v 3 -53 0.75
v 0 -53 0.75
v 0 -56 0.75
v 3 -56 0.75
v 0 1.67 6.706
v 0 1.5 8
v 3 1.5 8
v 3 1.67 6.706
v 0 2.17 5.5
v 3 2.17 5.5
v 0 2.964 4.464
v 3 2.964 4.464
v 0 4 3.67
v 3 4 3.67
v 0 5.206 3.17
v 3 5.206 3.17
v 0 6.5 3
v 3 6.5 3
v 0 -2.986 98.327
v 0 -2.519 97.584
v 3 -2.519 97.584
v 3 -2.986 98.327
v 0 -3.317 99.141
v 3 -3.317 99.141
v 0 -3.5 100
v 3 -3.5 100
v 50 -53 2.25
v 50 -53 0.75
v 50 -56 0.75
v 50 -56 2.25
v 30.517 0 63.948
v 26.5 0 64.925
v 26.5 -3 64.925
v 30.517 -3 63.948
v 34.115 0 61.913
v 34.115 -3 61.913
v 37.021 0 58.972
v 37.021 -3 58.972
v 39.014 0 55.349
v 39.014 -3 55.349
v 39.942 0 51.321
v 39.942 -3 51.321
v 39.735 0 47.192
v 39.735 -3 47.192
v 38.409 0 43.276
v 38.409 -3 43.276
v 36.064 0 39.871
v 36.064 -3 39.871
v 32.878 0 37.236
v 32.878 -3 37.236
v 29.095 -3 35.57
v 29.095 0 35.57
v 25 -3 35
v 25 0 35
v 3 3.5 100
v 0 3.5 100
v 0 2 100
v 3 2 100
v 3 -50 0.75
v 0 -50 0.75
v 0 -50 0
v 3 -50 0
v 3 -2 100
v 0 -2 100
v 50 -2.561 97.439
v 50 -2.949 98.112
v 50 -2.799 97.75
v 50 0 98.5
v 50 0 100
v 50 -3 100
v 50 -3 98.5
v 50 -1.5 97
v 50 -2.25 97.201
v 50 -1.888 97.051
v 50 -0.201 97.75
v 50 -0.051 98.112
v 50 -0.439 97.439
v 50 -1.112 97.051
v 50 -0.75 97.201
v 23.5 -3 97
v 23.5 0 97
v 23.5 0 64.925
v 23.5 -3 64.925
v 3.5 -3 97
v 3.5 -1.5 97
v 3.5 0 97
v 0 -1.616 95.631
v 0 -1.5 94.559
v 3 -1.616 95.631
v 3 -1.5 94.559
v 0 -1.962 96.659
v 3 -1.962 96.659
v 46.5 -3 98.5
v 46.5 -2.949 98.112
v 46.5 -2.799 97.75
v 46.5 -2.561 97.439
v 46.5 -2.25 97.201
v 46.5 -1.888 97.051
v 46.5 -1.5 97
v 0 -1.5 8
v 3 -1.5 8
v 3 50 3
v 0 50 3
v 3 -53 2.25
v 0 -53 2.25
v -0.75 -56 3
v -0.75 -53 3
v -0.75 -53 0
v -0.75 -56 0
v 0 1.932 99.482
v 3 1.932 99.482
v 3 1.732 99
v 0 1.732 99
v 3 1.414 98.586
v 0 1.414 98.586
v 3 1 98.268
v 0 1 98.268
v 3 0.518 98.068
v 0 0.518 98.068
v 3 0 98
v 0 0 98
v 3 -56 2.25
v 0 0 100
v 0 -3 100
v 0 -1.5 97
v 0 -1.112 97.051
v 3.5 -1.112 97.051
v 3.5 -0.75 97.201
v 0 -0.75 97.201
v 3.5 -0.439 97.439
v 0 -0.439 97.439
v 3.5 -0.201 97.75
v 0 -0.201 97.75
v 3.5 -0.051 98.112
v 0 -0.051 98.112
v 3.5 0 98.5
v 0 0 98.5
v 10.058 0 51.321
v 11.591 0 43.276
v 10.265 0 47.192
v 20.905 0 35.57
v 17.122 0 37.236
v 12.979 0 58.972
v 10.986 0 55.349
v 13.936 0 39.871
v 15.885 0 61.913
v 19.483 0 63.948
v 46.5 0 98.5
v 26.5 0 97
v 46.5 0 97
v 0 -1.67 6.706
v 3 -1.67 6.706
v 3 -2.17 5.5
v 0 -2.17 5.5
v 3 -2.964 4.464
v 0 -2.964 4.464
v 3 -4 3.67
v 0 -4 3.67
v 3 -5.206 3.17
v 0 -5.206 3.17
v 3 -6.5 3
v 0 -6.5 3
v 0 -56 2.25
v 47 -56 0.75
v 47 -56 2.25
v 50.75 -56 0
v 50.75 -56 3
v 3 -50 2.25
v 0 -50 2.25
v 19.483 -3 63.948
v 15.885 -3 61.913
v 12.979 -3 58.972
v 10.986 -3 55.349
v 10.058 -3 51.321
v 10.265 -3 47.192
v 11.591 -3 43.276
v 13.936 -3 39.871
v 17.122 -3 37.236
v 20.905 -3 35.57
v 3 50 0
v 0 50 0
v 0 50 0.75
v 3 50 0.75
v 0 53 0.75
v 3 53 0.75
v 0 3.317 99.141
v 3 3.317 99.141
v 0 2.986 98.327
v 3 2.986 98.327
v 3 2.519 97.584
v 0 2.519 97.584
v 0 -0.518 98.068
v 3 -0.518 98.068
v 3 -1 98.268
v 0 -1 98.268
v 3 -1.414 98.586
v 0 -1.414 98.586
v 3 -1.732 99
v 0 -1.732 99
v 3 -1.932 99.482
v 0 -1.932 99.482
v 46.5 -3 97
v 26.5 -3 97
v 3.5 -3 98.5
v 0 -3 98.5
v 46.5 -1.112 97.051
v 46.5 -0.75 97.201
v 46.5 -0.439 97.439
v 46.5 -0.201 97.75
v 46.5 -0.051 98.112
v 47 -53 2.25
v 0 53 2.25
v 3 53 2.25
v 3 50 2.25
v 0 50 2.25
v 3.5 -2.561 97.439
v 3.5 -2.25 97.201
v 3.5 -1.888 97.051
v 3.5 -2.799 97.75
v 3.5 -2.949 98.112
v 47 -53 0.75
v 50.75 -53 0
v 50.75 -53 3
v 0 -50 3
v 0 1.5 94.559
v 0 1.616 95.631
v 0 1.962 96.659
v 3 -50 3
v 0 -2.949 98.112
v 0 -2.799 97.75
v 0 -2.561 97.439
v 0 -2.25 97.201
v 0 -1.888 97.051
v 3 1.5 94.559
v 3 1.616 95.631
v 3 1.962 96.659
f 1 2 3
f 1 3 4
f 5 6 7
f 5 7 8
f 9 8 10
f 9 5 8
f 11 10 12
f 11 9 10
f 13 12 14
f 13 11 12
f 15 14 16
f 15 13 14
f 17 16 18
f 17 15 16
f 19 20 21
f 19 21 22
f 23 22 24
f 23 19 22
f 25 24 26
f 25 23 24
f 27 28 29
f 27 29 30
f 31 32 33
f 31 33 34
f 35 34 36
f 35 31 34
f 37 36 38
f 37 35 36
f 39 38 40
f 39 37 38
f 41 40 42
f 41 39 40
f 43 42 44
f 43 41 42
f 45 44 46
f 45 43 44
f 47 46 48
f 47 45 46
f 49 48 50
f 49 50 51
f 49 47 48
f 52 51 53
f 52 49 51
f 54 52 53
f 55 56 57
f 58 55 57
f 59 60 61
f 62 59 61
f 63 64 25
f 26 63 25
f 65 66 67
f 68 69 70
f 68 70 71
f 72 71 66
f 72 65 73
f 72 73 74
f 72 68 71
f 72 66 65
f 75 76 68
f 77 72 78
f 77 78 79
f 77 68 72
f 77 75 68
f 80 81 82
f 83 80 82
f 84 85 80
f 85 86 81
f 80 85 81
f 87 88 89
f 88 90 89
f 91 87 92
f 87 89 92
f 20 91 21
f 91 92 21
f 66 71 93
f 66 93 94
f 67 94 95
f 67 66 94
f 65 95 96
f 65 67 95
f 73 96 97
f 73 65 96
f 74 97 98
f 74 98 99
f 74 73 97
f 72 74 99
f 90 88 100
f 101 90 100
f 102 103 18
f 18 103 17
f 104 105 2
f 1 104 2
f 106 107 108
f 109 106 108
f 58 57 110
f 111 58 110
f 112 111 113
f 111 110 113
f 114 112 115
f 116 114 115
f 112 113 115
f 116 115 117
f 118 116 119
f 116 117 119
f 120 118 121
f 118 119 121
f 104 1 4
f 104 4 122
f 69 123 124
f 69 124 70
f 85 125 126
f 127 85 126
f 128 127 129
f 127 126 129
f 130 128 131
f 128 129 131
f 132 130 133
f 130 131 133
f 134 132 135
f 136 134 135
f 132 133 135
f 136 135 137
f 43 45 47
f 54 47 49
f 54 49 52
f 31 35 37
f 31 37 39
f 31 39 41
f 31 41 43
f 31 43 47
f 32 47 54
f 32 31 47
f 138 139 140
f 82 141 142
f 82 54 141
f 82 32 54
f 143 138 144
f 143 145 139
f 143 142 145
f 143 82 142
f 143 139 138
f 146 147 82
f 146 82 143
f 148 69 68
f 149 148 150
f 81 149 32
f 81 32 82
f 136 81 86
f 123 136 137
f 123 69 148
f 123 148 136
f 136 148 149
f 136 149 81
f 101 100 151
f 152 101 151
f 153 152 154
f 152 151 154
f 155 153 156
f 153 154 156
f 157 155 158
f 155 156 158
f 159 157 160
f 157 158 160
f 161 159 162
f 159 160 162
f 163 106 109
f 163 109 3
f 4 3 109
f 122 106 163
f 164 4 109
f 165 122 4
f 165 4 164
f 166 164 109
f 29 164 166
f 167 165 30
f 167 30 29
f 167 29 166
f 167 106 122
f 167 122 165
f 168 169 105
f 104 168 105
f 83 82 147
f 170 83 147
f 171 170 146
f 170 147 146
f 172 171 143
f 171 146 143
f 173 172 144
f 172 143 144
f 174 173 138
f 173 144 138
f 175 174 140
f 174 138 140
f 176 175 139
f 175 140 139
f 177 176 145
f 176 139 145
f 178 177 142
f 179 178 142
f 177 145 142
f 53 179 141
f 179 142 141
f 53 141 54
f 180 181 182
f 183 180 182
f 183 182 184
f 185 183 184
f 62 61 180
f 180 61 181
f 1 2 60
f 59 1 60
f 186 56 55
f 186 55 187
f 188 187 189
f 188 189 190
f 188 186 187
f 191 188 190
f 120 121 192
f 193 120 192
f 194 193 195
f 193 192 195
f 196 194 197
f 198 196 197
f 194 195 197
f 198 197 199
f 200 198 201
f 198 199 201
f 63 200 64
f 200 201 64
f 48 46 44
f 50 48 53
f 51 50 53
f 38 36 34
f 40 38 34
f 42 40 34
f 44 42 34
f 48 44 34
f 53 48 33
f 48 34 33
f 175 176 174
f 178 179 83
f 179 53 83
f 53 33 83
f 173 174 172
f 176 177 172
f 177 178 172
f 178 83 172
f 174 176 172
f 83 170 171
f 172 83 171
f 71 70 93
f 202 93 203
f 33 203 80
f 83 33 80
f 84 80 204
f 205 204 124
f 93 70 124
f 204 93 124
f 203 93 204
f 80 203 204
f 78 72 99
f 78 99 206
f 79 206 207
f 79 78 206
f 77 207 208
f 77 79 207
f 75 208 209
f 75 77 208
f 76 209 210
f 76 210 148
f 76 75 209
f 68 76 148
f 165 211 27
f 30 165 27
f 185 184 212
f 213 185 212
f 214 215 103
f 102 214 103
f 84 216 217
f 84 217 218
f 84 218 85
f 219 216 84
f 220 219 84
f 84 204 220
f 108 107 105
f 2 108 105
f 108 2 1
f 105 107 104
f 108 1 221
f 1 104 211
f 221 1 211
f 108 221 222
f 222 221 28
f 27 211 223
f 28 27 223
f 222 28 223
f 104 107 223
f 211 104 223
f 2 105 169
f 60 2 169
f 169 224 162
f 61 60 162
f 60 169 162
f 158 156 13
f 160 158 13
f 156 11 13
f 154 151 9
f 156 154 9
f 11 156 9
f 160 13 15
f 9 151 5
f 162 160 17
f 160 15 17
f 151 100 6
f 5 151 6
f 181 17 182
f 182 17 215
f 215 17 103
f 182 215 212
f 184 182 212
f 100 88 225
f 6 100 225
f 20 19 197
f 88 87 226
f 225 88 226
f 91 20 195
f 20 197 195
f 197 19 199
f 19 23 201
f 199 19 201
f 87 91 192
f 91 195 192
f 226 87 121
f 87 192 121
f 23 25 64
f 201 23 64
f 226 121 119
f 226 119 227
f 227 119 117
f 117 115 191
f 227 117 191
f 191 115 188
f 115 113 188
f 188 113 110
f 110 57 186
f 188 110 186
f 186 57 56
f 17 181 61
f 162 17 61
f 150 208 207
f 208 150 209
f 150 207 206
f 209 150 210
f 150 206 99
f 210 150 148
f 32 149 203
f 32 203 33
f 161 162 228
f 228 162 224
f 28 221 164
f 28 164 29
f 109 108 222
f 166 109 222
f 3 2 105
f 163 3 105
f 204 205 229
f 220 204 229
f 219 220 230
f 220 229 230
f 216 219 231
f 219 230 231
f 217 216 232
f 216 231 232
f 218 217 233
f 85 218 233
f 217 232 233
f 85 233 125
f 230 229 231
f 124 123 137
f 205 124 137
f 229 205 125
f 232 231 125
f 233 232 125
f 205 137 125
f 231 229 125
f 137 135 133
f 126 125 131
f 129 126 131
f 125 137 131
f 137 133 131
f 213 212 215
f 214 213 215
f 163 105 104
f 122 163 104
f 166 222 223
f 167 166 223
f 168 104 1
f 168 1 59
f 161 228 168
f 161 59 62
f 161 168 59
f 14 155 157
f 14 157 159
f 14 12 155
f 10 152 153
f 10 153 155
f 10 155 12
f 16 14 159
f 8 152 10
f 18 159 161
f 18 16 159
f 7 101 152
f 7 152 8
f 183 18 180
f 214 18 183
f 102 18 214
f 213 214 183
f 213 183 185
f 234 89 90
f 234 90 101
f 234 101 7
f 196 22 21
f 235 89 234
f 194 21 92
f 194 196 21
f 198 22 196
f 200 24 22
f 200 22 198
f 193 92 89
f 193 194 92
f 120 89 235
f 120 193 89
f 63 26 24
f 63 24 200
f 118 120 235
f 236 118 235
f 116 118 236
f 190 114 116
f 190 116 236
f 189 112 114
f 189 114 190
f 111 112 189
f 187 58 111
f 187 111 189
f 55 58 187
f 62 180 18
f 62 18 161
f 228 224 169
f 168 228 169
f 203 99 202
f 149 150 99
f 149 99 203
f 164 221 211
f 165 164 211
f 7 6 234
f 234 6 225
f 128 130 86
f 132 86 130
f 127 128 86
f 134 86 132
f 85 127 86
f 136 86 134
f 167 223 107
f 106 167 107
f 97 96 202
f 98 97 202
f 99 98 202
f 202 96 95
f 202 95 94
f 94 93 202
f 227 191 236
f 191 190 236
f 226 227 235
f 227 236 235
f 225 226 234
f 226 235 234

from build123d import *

# Parameters (mm, degrees)
F1_DEPTH    = 3
F2_T1_DEPTH = 3
F2_T3_DEPTH = 3
F2_T5_DEPTH = 13.0928039389
F2_T7_DEPTH = 13.0928039389
F3_R        = 5
F4_W        = 3
F4_H        = 1.5
F5_DEPTH    = 3
F7_DEPTH    = 3
F9_DEPTH    = 3.5


# Not quite as in the source:
# - a fillet or chamfer that OpenCascade refuses, or shapes differently, is made with other operations: its cross-section is extruded or revolved along the edge and cut away or added


with BuildPart() as f1:
    # F0 (on Right) → F1 (new body)
    with BuildSketch(Plane.YZ):
        with BuildLine():
            ThreePointArc((0, 98), (-1.4142135624, 98.5857864376), (-2, 100))
            Line((-2, 100), (-3.5, 100))
            Line((-3.5, 100), (-3.5, 98.5))
            Line((-3.5, 98.5), (-1.5, 96.5))
            Line((-1.5, 96.5), (-1.5, 3))
            Line((-1.5, 3), (-50, 3))
            Line((-50, 3), (-50, 2.25))
            Line((-50, 2.25), (-53, 2.25))
            Line((-53, 2.25), (-53, 0.75))
            Line((-53, 0.75), (-50, 0.75))
            Line((-50, 0.75), (-50, 0))
            Line((-50, 0), (0, 0))
            Line((0, 0), (50, 0))
            Line((50, 0), (50, 0.75))
            Line((50, 0.75), (53, 0.75))
            Line((53, 0.75), (53, 2.25))
            Line((53, 2.25), (50, 2.25))
            Line((50, 2.25), (50, 3))
            Line((50, 3), (1.5, 3))
            Line((1.5, 3), (1.5, 96.5))
            Line((1.5, 96.5), (3.5, 98.5))
            Line((3.5, 98.5), (3.5, 100))
            Line((3.5, 100), (2, 100))
            ThreePointArc((2, 100), (1.4142135624, 98.5857864376), (0, 98))
        make_face()
    extrude(amount=F1_DEPTH)

    # F2: fillet of radius 5 on 4 edges, made by hand

    # F2_s2 → F2_t1 (join)
    with BuildSketch(Plane.YZ):
        with BuildLine():
            ThreePointArc((1.5, 8), (2.9644660941, 4.4644660941), (6.5, 3))
            Line((6.5, 3), (1.5, 3))
            Line((1.5, 3), (1.5, 8))
        make_face()
    extrude(amount=F2_T1_DEPTH)

    # F2_s4 → F2_t3 (join)
    with BuildSketch(Plane.YZ):
        with BuildLine():
            ThreePointArc((-1.5, 8), (-2.9644660941, 4.4644660941), (-6.5, 3))
            Line((-6.5, 3), (-1.5, 3))
            Line((-1.5, 3), (-1.5, 8))
        make_face()
    extrude(amount=F2_T3_DEPTH)

    # F2_s6 → F2_t5 (cut)
    with BuildSketch(Plane.YZ.offset(-5.0464019695)):
        with BuildLine():
            ThreePointArc((3.5, 100), (3.0313524106, 98.4168612226), (2.0726619787, 97.0726619787))
            Line((2.0726619787, 97.0726619787), (3.5, 98.5))
            Line((3.5, 98.5), (3.5, 100))
        make_face()
    extrude(amount=F2_T5_DEPTH, mode=Mode.SUBTRACT)

    # F2_s8 → F2_t7 (cut)
    with BuildSketch(Plane.YZ.offset(-5.0464019695)):
        with BuildLine():
            ThreePointArc((-2.0726619787, 97.0726619787), (-3.0313524106, 98.4168612226), (-3.5, 100))
            Line((-3.5, 100), (-3.5, 98.5))
            Line((-3.5, 98.5), (-2.0726619787, 97.0726619787))
        make_face()
    extrude(amount=F2_T7_DEPTH, mode=Mode.SUBTRACT)

    # F3
    f3_edges = [f1.edges().sort_by_distance(p)[0] for p in [
        (1.5, -1.5, 96.5),
        (1.5, 1.5, 96.5),
    ]]
    fillet(f3_edges, radius=F3_R)


with BuildPart() as f5:
    # F4 (on face) → F5 (new body)
    with BuildSketch(Plane.XZ.offset(53)):
        Polygon((-0.75, 0), (0, 0), (25, 0), (50, 0), (50.75, 0), (50.75, 3), (50, 3), (47, 3), (25, 3), (3, 3), (0, 3), (-0.75, 3), align=None)
        with Locations((1.5, 1.5)):
            Rectangle(F4_W, F4_H, mode=Mode.SUBTRACT)
        with Locations((48.5, 1.5)):
            Rectangle(F4_W, F4_H, mode=Mode.SUBTRACT)
    extrude(amount=F5_DEPTH)


with BuildPart() as f7:
    # F6 (on Front) → F7 (new body)
    with BuildSketch(Plane.XZ):
        with BuildLine():
            Line((25, 64.9248115566), (25, 100))
            Line((25, 100), (0, 100))
            Line((0, 100), (0, 97))
            Line((0, 97), (23.5, 97))
            Line((23.5, 97), (23.5, 64.9248115566))
            ThreePointArc((23.5, 64.9248115566), (10.0188089033, 49.2490583741), (25, 35))
            Line((25, 35), (25, 64.9248115566))
        make_face()
    extrude(amount=F7_DEPTH)

    # F8 (on face) → F9 (cut)
    with BuildSketch(Plane(origin=(0, 0, 0), x_dir=(0, -1, 0), z_dir=(-1, 0, 0))):
        with BuildLine():
            Line((3, 97), (3, 98.5))
            ThreePointArc((3, 98.5), (2.5606601718, 97.4393398282), (1.5, 97))
            Line((1.5, 97), (3, 97))
        make_face()
        with BuildLine():
            Line((0, 97), (1.5, 97))
            ThreePointArc((1.5, 97), (0.4393398282, 97.4393398282), (0, 98.5))
            Line((0, 98.5), (0, 97))
        make_face()
    extrude(amount=-F9_DEPTH, mode=Mode.SUBTRACT)

    # F10: F7 across face


with BuildPart() as f7_1:
    add(f7.part)
    add(f7.part.mirror(Plane(origin=(25, -1.5, 67.5), x_dir=(0, 1, 0), z_dir=(1, 0, 0))))


solid = Compound([f1.part, f5.part, f7_1.part])
